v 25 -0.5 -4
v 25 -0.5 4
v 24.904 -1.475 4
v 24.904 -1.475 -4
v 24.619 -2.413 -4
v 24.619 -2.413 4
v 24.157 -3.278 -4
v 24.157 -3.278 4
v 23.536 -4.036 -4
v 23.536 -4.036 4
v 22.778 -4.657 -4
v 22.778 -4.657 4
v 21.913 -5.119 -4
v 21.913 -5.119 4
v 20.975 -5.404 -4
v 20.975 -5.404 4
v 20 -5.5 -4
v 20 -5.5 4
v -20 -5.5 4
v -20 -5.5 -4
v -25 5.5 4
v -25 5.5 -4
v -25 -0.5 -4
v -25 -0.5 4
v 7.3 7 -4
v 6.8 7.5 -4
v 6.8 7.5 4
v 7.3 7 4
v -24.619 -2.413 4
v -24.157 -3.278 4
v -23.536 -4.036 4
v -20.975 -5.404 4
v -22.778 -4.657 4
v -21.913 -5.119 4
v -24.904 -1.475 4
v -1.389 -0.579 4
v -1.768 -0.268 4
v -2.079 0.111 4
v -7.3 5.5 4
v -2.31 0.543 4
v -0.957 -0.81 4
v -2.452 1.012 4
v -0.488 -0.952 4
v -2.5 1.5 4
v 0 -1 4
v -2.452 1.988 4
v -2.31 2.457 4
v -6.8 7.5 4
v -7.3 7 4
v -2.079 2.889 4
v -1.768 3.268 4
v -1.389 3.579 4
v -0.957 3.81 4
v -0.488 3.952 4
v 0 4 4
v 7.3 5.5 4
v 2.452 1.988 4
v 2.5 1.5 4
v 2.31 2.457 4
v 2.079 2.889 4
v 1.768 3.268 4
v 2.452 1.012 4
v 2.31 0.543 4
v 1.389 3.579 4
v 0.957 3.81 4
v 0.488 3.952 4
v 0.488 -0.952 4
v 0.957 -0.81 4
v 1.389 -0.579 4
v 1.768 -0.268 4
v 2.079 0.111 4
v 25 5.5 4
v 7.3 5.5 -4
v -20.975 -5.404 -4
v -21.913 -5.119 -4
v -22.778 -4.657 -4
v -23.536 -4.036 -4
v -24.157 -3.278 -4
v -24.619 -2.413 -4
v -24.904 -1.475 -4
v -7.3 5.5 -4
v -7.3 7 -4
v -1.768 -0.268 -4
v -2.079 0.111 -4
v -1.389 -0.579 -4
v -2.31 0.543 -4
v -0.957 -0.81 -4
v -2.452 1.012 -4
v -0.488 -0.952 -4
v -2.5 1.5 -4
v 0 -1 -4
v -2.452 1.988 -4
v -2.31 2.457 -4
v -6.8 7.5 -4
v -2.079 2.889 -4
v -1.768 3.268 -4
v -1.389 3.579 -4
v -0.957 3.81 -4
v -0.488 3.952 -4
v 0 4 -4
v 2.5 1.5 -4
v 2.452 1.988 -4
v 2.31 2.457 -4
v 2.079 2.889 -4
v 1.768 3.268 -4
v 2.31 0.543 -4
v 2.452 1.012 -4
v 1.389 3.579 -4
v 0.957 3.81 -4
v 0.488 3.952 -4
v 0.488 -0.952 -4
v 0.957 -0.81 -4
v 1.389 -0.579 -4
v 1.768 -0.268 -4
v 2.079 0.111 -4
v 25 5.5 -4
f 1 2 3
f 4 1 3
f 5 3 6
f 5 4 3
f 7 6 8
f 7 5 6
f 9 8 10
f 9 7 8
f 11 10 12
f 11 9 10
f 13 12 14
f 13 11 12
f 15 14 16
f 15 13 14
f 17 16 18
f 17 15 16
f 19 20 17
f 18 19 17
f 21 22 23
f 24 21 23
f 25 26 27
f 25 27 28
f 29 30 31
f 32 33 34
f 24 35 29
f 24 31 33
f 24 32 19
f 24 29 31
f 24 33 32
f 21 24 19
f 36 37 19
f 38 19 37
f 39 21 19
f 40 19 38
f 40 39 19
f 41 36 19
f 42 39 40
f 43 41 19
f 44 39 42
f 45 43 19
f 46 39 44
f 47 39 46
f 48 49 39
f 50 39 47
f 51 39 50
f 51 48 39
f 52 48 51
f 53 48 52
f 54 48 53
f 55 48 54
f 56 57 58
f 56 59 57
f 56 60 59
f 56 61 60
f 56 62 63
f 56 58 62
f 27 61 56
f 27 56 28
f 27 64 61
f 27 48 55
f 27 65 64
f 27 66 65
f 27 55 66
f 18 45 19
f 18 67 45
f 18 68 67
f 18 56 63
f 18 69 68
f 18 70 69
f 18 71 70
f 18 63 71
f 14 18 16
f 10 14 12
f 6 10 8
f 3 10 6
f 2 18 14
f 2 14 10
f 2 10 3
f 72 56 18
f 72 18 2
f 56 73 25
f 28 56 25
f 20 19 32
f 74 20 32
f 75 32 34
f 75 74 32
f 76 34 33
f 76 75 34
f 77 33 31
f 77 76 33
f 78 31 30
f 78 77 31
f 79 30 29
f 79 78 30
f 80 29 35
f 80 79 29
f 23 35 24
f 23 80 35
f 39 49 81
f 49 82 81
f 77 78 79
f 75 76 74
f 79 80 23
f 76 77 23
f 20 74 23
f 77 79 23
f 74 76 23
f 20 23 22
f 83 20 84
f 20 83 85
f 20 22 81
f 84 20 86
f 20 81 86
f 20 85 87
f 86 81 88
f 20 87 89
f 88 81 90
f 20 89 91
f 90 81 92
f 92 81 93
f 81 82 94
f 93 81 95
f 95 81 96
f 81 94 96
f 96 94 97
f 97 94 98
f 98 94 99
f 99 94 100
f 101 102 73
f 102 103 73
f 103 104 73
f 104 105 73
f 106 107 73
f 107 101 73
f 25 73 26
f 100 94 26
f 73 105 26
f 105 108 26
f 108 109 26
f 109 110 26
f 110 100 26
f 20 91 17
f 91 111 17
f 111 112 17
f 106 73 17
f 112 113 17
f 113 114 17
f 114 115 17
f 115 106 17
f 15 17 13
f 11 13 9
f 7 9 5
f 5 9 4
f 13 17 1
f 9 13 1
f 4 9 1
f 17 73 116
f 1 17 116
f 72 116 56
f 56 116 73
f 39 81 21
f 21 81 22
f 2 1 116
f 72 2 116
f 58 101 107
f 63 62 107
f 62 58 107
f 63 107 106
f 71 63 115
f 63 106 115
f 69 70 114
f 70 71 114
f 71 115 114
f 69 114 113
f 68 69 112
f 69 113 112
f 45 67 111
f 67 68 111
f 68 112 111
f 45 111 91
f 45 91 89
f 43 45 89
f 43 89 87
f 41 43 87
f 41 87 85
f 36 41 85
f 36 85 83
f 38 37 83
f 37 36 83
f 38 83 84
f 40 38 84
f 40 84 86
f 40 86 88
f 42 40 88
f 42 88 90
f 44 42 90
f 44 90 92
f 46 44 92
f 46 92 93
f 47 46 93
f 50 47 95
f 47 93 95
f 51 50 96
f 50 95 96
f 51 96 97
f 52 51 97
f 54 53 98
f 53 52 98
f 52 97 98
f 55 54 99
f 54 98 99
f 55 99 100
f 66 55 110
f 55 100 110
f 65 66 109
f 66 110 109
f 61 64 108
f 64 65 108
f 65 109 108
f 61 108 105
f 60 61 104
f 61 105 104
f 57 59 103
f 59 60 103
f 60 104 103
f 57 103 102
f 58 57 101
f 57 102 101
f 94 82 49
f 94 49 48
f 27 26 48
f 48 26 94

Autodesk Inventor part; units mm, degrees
ref_plane "YZ Plane" through (0, 0, 0) normal (1, 0, 0) x (0, 1, 0)
ref_plane "XZ Plane" through (0, 0, 0) normal (0, 1, 0) x (-1, 0, 0)
ref_plane "XY Plane" through (0, 0, 0) normal (0, 0, 1) x (1, 0, 0)
sketch "草圖1" plane through (0, 0, 0) normal (0, 0, 1) x (1, 0, 0)
  line L0 (0, 0) -> (-25.6572, 0) construction
  line L1 (0, 0) -> (0, 25.6407) construction
  line L2 (-20, -5.5) -> (-8.1185, -5.5)
  line L3 (25, -0.5) -> (25, 5.5)
  line L4 (25, 5.5) -> (-25, 5.5)
  line L5 (-25, 5.5) -> (-25, -0.5)
  line L6 (-25, -5.5) -> (25, 5.5) construction
  line L7 (25, -5.5) -> (-25, 5.5) construction
  arc A0 (20, -5.5) -> (25, -0.5) centre (20, -0.5) ccw
  arc A1 (-25, -0.5) -> (-20, -5.5) centre (-20, -0.5) ccw
  line L8 (-8.1185, -5.5) -> (20, -5.5)
  line L9 (7.3, 5.5) -> (7.3, 7)
  line L10 (6.8, 7.5) -> (-6.8, 7.5)
  line L11 (-7.3, 7) -> (-7.3, 5.5)
  circle A2 centre (0, 1.5) radius 2.5
  line L12 (-7.3, 7) -> (-6.8, 7.5)
  line L13 (6.8, 7.5) -> (7.3, 7)
  point P0 (7.3, 7.5)
  point P1 (-7.3, 7.5)
  dimension "d0" = 50
  dimension "d4" = 5
  dimension "d13" = 2
  dimension "d14" = 14.6
  dimension "d15" = 5
  dimension "d20" = 0.5
  dimension "d21" = 0.5
  dimension "d22" = 0.5
  dimension "d23" = 0.5
  dimension "d27" = 11
  dimension "d28" = 4
extrude "擠出1" add sketch "草圖1" along normal mid plane 8
thread "螺紋1" size "M6x1" class "6H" standard "ANSI Metric M Profile" full length
equation "\"d21\" = d20"
equation "\"d22\" = d20"
equation "\"d23\" = d22"
equation "\"折彎半徑\" = 厚度"
equation "\"折彎離隙寬度\" = 厚度"
equation "\"折彎離隙深度\" = 0.5 * 厚度"
equation "\"轉角離隙大小\" = 4 * 厚度"
equation "\"最小剩餘\" = 2 * 厚度"
equation "\"轉移半徑\" = 折彎半徑"
equation "\"Jacobi半徑大小\" = 折彎半徑"
equation "\"間隙大小\" = 厚度"
equation "\"厚度\" = 8"
properties part number "0 零件" material "不鏽鋼"
